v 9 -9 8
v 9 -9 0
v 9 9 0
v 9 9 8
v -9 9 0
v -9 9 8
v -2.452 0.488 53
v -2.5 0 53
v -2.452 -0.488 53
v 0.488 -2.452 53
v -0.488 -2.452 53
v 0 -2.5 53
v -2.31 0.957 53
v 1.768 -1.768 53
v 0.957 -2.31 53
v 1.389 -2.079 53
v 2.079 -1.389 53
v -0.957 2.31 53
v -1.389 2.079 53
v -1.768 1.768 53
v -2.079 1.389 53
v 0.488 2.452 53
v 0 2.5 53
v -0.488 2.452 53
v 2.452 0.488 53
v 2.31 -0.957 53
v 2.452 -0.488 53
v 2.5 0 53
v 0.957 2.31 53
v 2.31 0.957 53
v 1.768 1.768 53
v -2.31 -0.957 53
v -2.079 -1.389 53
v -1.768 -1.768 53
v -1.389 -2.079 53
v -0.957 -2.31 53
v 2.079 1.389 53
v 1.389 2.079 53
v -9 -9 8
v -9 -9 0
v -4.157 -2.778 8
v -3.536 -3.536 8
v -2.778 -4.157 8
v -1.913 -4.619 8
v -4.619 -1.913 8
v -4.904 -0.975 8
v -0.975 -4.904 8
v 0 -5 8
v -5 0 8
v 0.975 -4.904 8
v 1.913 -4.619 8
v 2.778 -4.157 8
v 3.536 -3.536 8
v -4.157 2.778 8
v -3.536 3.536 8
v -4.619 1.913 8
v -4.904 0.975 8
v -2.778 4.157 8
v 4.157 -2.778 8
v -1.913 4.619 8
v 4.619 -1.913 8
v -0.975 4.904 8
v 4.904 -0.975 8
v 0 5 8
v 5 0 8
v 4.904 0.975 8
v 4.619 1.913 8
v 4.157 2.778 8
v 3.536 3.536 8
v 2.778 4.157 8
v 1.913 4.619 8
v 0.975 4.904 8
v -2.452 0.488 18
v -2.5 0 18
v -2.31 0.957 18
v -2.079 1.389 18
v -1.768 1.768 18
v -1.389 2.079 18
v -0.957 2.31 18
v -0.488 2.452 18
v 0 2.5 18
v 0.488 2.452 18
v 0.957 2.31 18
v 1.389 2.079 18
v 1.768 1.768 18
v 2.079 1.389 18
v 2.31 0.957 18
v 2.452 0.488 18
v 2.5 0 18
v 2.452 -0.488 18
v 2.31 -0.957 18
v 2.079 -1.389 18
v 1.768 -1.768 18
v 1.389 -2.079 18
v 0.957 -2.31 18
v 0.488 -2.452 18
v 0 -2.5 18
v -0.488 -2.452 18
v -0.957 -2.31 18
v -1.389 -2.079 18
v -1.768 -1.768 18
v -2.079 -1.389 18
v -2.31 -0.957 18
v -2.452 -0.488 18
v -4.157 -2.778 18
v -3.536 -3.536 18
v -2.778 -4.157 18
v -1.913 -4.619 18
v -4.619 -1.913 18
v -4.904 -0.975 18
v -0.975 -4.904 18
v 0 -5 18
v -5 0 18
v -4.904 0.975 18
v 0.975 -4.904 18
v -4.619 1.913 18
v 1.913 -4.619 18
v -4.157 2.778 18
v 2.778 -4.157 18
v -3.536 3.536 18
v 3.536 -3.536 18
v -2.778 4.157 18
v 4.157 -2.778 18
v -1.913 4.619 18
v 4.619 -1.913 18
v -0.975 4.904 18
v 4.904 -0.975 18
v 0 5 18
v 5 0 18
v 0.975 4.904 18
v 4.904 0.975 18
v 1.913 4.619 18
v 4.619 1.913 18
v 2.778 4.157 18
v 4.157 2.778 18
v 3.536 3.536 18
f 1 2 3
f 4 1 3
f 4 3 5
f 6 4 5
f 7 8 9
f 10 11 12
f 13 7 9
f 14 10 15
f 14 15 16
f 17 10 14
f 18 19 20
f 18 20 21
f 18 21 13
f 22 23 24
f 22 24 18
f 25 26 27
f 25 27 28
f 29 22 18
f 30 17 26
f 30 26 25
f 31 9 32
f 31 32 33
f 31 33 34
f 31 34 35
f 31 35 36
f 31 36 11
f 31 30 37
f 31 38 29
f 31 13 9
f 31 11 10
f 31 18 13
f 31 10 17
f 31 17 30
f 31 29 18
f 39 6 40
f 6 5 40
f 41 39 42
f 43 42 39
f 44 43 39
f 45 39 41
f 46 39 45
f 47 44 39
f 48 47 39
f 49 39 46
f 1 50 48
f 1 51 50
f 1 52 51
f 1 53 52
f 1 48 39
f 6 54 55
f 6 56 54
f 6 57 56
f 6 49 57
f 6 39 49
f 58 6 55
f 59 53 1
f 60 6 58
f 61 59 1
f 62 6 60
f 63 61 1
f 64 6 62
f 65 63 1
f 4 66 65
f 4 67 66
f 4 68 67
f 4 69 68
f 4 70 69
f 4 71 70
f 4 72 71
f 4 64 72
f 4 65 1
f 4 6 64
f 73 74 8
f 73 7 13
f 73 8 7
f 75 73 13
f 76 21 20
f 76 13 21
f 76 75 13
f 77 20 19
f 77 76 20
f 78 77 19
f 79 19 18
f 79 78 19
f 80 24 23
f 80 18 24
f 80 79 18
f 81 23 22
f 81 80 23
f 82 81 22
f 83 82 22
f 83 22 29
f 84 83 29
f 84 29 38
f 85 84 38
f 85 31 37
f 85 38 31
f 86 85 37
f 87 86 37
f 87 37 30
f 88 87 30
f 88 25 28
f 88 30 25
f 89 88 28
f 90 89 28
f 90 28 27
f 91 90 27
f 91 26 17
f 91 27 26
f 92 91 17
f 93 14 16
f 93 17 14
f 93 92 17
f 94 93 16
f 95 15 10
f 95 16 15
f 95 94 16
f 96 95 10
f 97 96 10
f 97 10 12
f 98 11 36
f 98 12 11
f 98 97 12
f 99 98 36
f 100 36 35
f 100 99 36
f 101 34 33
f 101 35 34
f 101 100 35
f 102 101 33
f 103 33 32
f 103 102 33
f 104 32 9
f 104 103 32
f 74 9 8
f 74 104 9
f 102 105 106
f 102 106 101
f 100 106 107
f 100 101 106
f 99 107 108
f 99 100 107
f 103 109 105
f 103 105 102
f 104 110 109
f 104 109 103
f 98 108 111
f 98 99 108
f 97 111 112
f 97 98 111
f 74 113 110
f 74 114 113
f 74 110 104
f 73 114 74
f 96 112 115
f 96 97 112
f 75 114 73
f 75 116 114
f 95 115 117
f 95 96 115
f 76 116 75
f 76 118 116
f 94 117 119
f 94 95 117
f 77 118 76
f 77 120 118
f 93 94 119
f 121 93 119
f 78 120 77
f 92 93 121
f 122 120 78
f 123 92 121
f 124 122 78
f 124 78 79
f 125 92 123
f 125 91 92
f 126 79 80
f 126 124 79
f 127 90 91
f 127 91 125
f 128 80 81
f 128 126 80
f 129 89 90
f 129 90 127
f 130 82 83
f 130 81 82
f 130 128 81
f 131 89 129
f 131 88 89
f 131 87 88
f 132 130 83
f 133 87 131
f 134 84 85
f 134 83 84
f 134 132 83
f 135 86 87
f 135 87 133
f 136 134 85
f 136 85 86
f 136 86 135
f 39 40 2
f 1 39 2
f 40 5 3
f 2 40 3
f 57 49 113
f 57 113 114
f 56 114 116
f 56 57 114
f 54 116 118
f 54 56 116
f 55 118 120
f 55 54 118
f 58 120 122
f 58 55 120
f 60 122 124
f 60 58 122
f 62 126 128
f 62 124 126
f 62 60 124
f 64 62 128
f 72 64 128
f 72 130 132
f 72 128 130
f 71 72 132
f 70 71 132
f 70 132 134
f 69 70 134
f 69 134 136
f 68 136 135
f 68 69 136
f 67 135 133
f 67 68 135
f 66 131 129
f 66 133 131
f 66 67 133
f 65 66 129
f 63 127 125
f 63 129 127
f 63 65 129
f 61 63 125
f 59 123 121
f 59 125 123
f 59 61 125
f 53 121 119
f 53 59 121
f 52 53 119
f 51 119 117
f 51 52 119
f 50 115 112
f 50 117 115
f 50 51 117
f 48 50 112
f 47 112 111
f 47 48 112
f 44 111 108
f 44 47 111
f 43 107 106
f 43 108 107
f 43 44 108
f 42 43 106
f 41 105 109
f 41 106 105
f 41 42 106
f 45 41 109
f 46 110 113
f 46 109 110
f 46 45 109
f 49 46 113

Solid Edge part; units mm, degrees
sketch "Sketch1" plane through (0, 0, 0) normal (0, 0, 1) x (1, 0, 0)
  line L0 (9, 9) -> (-9, 9)
  line L1 (-9, 9) -> (-9, -9)
  line L2 (-9, -9) -> (9, -9)
  line L3 (9, -9) -> (9, 9)
extrude "Protrusion1" add sketch "Sketch1" along normal blind 8
sketch "Sketch2" plane through (0, 0, 8) normal (0, 0, 1) x (-1, 0, 0)
  circle A0 centre (0, 0) radius 5
extrude "ExtrudedProtrusion_2" add sketch "Sketch2" along normal blind 10
sketch "Sketch3" plane through (0, 0, 18) normal (0, 0, 1) x (-1, 0, 0)
  circle A0 centre (0, 0) radius 2.5
extrude "ExtrudedProtrusion_3" add sketch "Sketch3" along normal blind 35
